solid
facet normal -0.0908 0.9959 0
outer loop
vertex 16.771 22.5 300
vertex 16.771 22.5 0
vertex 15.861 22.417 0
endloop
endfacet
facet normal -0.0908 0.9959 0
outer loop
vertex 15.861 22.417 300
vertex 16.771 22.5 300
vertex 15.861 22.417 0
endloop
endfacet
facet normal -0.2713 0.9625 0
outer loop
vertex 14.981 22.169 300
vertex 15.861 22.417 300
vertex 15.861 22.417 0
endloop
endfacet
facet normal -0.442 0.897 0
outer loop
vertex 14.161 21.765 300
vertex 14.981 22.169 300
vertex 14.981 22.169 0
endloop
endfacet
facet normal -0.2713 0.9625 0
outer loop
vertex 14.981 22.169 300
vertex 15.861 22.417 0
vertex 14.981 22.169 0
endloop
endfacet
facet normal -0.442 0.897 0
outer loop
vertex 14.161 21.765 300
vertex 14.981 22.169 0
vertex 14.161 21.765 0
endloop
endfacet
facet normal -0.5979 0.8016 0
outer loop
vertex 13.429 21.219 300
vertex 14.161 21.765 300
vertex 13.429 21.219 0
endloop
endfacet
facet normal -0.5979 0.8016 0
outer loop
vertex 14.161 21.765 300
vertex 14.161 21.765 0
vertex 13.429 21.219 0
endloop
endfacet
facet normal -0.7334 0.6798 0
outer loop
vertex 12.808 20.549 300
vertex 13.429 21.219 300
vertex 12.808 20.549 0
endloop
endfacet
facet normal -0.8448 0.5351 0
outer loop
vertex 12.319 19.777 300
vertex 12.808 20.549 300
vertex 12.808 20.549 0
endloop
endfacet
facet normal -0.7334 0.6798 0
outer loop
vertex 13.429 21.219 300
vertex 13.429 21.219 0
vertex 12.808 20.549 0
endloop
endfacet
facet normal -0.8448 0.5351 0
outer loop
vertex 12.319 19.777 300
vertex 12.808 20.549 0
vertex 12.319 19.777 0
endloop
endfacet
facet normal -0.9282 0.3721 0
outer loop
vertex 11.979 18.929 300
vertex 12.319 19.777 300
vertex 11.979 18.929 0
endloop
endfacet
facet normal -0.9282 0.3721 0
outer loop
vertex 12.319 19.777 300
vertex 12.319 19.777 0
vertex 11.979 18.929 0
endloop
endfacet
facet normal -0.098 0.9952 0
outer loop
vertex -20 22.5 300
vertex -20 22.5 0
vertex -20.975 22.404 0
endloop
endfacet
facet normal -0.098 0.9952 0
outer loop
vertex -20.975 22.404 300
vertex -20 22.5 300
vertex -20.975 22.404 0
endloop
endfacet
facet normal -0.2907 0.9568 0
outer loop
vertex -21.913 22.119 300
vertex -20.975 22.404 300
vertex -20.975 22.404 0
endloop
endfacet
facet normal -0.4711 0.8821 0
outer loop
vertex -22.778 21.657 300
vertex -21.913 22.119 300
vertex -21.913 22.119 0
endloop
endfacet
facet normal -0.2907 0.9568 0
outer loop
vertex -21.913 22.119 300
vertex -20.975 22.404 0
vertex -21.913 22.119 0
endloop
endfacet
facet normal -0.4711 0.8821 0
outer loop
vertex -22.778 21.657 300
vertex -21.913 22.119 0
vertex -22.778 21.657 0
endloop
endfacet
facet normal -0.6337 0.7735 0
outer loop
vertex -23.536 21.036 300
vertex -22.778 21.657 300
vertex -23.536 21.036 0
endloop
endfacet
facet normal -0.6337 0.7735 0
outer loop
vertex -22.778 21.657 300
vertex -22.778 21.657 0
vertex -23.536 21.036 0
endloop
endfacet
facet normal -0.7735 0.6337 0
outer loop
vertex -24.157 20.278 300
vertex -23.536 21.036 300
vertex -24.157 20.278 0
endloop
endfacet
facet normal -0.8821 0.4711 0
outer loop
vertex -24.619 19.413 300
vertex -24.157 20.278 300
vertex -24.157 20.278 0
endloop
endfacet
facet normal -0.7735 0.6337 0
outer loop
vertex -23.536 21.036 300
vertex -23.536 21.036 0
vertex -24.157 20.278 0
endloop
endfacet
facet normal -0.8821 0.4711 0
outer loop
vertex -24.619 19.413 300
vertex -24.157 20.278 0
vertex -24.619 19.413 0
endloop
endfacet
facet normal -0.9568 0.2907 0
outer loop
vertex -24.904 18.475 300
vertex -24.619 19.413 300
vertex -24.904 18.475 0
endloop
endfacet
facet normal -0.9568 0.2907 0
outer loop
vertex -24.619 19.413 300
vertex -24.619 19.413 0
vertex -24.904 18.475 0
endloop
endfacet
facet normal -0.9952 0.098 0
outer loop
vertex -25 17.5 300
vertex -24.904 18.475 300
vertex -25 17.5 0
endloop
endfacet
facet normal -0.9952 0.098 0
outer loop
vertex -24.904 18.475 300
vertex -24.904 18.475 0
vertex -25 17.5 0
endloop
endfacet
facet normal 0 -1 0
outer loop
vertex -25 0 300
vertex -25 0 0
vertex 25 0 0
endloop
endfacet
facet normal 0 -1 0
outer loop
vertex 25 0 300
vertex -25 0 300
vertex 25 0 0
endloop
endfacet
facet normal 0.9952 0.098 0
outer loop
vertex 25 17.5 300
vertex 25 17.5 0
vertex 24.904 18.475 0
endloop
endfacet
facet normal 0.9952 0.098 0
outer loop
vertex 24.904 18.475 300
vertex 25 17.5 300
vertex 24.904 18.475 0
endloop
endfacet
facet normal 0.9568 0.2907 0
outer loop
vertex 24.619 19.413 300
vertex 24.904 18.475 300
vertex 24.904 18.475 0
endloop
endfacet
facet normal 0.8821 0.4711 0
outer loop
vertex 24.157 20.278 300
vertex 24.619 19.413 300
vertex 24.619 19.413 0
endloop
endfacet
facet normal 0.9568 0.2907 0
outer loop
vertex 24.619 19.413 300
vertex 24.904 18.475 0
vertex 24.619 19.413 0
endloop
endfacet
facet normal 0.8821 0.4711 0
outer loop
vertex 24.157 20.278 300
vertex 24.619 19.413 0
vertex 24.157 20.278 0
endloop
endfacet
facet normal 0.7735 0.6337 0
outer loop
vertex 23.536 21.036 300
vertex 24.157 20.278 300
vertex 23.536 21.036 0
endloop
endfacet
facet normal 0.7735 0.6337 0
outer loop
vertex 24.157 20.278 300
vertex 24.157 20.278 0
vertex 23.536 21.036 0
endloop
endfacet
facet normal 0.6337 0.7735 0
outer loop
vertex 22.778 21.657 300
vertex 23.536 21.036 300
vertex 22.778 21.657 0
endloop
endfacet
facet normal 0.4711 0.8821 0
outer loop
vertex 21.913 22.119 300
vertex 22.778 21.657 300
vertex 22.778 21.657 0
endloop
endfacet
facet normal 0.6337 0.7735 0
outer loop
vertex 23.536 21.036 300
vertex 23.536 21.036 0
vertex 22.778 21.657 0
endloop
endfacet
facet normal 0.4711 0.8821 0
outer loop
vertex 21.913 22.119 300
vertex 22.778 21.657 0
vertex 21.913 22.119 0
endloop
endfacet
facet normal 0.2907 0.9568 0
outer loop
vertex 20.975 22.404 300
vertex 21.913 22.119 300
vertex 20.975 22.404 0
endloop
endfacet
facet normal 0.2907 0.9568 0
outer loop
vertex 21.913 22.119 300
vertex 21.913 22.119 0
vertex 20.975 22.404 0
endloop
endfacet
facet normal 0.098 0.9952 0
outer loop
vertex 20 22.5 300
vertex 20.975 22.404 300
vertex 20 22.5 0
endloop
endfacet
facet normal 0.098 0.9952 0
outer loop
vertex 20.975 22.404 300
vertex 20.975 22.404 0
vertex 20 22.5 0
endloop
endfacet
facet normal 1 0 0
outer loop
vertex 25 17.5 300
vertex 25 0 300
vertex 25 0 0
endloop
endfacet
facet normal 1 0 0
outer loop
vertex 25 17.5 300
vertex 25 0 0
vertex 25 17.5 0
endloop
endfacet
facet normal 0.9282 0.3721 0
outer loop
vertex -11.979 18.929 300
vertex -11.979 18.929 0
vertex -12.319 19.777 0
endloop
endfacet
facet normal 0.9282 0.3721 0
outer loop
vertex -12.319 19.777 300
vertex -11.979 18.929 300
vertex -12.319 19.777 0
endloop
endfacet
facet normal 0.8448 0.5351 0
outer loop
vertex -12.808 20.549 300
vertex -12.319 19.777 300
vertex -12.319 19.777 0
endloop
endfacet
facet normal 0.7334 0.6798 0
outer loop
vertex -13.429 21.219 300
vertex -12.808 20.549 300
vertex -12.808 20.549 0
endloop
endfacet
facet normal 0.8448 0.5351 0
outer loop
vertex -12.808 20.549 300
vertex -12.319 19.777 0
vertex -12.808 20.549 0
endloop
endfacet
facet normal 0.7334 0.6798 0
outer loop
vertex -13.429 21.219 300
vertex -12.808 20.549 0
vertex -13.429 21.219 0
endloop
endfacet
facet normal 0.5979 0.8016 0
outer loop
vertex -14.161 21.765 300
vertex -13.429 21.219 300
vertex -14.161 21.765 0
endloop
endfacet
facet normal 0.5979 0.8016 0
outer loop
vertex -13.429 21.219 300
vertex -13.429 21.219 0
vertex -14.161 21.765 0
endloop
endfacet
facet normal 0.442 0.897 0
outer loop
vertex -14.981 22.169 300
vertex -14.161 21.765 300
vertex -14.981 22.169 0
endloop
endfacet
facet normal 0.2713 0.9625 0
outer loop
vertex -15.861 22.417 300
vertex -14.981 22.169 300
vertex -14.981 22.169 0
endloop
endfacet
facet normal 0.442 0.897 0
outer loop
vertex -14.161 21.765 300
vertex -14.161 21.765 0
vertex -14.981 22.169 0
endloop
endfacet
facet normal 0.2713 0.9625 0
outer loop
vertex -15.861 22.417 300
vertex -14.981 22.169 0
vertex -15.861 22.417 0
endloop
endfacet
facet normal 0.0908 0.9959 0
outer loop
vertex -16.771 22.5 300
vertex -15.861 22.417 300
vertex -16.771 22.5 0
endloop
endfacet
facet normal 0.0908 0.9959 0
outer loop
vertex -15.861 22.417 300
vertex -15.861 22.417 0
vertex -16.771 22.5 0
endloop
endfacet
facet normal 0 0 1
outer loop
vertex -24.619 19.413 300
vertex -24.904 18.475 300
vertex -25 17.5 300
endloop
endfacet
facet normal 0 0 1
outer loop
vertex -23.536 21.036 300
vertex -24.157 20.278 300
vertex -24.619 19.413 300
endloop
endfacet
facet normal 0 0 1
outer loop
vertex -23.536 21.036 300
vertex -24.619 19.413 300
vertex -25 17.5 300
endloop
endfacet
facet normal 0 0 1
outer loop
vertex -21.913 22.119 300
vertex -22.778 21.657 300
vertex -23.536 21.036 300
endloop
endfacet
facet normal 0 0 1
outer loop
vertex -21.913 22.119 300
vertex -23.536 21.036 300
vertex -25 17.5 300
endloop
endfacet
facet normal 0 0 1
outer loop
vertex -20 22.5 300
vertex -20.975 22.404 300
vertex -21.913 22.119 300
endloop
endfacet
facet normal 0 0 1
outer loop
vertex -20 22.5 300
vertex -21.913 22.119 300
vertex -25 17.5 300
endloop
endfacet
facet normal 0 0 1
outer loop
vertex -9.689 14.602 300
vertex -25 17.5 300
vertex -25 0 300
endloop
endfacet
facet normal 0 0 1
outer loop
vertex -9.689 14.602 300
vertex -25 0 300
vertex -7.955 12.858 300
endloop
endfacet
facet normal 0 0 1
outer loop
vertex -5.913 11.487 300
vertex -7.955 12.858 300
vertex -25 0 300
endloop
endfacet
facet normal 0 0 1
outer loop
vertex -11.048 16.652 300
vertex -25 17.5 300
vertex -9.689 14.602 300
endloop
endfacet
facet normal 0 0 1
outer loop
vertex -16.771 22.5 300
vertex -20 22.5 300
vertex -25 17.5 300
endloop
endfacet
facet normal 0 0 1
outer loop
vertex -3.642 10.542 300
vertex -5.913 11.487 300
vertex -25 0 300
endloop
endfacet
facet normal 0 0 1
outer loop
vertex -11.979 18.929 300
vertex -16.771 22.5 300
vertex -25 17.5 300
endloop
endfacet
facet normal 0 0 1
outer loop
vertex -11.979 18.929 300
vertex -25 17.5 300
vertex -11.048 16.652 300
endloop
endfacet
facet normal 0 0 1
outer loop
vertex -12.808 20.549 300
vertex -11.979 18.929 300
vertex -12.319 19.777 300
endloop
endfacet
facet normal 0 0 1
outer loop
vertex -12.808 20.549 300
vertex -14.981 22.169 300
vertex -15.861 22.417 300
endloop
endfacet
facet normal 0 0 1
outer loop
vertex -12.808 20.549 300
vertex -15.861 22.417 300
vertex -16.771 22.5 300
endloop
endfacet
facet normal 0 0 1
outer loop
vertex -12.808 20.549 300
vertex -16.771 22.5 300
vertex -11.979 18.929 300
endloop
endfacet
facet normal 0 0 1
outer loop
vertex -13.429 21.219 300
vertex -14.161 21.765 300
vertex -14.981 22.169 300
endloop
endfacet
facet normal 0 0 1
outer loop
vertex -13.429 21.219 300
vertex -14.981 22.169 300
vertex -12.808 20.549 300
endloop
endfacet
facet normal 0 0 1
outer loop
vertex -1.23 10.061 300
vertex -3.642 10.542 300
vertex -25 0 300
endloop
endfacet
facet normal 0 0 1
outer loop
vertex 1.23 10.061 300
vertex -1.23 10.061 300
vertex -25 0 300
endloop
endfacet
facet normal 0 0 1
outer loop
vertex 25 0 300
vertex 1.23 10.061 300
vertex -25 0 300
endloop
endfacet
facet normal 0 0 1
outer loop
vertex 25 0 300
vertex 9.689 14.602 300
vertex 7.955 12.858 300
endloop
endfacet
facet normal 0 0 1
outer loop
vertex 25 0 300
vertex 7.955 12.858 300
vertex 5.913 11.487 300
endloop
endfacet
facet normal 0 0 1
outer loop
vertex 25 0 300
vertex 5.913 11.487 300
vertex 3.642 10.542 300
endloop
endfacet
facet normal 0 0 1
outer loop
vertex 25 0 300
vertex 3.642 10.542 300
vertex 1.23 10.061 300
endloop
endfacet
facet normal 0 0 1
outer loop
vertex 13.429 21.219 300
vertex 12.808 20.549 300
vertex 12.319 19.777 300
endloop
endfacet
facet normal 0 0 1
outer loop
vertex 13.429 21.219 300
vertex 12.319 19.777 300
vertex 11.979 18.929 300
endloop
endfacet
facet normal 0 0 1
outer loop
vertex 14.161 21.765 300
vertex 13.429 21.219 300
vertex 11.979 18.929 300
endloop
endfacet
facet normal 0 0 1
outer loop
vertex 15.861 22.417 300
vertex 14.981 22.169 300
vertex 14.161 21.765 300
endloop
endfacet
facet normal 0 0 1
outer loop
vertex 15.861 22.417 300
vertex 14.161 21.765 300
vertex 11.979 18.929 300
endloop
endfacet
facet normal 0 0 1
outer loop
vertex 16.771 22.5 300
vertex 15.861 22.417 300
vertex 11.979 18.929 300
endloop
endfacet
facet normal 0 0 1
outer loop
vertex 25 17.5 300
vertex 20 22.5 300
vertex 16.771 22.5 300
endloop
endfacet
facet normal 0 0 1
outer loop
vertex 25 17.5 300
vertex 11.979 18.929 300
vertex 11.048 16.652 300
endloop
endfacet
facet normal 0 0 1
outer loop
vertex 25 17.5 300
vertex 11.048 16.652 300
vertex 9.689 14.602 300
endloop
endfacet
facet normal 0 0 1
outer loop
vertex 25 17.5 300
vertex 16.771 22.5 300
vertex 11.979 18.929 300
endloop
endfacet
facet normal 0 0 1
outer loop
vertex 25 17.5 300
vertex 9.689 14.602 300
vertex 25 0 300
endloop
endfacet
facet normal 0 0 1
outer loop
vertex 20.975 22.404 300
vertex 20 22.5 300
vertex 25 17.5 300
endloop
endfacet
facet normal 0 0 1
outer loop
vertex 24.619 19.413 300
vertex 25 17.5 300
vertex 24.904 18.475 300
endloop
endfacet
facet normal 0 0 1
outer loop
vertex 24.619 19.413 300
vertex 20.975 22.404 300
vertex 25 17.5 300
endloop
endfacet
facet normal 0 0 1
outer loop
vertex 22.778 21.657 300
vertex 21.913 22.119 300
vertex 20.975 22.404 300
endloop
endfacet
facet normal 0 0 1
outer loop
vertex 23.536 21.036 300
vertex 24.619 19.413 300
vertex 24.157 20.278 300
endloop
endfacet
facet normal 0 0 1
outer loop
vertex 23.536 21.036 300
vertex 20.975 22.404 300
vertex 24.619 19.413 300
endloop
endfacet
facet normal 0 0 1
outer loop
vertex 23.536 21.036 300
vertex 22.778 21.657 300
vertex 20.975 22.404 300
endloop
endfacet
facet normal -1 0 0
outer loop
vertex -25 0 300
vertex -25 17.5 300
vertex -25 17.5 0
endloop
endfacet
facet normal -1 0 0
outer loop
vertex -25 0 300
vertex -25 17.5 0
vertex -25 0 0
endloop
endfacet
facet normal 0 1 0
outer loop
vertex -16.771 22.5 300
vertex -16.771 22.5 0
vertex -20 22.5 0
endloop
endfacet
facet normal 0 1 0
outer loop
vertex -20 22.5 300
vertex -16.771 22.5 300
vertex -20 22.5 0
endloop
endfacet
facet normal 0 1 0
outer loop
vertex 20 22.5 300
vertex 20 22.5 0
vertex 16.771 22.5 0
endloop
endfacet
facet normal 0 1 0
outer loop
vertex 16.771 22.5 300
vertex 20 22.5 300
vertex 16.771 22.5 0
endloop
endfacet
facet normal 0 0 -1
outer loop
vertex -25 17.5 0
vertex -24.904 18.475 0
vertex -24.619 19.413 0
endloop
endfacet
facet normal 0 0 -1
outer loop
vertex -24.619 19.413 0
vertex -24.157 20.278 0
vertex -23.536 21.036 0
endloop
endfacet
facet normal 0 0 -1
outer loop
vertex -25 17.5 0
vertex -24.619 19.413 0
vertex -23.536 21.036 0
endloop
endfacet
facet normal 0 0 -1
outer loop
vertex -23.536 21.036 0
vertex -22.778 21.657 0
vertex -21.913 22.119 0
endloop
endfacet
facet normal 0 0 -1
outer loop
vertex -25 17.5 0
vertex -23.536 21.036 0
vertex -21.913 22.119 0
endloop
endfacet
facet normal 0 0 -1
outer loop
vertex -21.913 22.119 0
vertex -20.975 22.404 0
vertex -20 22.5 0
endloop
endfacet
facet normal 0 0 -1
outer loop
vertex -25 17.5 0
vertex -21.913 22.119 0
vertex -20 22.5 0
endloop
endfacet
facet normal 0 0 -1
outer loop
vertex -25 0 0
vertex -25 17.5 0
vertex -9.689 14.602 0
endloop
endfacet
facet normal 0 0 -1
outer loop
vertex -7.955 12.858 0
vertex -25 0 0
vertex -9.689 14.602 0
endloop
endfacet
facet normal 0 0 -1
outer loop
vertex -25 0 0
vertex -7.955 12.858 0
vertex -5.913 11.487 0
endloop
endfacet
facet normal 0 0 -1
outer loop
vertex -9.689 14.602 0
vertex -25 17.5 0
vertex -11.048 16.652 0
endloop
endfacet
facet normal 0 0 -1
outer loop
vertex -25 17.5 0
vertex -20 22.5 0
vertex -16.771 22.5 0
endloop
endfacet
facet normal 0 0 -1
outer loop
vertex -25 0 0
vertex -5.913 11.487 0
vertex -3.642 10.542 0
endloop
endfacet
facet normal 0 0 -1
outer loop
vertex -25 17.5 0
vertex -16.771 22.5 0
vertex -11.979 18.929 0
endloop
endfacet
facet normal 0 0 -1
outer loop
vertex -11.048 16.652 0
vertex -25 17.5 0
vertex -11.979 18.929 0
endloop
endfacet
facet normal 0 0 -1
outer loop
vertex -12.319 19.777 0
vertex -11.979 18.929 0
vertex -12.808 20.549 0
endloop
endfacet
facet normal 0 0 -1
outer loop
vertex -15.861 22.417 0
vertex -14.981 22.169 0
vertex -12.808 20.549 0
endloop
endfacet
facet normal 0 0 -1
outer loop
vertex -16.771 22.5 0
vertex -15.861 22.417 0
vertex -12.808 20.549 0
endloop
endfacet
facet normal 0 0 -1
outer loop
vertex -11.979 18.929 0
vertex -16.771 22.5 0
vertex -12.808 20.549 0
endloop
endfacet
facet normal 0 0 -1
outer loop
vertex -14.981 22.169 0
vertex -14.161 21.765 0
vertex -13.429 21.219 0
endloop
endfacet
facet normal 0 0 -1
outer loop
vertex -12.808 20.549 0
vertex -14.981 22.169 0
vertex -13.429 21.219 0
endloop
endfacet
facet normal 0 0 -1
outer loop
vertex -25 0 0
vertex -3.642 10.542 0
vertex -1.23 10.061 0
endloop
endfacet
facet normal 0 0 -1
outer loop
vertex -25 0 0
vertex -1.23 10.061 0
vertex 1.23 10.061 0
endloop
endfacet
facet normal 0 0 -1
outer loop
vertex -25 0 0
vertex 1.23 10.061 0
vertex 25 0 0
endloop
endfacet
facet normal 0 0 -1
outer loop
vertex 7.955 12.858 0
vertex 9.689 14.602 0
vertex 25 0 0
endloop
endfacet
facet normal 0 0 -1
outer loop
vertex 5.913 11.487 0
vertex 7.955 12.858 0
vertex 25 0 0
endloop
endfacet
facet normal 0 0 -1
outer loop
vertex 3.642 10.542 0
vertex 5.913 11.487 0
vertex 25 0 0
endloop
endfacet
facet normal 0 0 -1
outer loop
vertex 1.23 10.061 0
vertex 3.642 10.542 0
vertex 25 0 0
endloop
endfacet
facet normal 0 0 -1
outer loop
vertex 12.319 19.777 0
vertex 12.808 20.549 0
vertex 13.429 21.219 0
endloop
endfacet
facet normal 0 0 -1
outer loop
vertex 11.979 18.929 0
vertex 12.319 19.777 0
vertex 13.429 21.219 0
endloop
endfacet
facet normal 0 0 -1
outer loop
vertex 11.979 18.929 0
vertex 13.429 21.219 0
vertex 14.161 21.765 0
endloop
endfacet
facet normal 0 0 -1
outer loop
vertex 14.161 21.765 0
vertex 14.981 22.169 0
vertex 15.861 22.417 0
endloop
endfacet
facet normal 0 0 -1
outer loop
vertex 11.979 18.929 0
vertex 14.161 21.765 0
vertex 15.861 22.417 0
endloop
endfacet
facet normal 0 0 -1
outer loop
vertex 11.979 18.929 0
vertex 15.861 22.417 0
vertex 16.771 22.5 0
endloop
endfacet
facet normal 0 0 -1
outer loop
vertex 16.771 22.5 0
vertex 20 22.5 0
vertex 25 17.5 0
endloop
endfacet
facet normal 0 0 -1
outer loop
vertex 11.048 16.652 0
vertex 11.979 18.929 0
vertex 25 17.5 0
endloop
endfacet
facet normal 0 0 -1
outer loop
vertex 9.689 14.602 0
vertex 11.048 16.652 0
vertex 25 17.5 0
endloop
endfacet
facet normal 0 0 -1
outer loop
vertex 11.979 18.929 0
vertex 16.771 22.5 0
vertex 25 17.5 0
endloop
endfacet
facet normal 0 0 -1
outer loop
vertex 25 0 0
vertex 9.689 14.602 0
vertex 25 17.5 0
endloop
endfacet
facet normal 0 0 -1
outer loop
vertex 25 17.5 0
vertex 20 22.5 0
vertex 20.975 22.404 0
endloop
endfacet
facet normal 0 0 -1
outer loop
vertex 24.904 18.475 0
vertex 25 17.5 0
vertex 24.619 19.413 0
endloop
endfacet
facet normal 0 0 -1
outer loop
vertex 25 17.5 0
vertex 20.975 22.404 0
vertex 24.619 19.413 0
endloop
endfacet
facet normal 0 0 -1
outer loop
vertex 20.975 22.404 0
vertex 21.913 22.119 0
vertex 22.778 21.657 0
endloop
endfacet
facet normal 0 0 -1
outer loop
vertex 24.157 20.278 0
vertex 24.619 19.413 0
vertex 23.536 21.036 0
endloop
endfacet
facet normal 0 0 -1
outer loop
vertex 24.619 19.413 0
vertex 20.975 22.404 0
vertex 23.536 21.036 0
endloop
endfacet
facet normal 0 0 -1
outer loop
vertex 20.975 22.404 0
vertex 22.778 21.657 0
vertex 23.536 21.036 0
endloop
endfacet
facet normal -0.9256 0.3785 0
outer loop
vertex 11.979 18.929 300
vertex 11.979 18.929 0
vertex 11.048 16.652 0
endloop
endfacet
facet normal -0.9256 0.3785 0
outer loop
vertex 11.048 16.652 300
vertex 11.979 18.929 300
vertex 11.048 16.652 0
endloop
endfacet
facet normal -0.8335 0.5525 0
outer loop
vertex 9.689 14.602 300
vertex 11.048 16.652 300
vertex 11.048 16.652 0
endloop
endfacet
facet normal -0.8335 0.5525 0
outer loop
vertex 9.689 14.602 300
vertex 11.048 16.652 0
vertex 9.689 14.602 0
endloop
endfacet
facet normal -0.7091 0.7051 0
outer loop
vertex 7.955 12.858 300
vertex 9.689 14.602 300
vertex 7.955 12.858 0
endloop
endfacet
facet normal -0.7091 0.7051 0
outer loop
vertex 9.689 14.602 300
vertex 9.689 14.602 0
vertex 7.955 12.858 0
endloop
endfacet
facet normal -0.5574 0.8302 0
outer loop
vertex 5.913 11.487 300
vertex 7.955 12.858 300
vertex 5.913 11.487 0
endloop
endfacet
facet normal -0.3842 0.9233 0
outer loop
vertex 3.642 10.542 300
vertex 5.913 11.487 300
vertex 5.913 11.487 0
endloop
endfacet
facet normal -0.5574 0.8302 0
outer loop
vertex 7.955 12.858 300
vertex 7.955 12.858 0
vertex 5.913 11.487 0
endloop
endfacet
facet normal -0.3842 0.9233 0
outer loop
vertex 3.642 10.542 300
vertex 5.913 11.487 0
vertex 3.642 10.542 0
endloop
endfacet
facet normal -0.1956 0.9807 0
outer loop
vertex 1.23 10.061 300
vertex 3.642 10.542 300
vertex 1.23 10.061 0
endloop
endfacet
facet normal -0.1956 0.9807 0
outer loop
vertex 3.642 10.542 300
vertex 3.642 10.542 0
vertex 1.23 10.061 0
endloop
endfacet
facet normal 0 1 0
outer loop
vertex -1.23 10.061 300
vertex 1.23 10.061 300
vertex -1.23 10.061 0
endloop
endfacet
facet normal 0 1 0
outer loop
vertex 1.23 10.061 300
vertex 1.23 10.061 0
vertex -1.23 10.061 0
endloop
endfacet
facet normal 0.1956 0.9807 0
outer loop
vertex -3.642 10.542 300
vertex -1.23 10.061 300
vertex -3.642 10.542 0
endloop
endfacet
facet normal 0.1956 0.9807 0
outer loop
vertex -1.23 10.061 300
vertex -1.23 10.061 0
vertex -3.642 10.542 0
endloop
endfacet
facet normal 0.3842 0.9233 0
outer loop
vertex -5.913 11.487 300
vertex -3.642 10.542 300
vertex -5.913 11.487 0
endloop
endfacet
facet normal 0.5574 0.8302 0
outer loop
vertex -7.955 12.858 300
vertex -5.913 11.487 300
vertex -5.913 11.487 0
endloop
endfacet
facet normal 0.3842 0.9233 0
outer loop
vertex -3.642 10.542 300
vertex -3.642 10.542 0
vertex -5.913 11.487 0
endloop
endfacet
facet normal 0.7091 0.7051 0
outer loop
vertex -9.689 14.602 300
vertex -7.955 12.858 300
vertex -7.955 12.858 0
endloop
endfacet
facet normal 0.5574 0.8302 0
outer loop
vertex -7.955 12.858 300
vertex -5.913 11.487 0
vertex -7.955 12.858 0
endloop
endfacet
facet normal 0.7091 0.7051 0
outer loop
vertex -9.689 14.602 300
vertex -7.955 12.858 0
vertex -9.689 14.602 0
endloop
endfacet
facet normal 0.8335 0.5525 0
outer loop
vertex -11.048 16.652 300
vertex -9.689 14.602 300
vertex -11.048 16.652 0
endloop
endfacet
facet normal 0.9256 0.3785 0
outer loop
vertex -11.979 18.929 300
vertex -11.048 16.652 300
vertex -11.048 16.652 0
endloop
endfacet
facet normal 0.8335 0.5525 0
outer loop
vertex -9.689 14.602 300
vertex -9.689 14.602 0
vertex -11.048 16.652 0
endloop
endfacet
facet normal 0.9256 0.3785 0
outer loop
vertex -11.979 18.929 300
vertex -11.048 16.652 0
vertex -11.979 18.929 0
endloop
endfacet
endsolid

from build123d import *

# Parameters (mm, degrees)
BOSS_EXTRUDE1_DEPTH = 300


with BuildPart() as part:
    # Sketch3 → Boss-Extrude1 (new body)
    with BuildSketch(Plane.XY):
        with BuildLine():
            Line((-25, 0), (25, 0))
            Line((25, 0), (25, 17.5))
            ThreePointArc((25, 17.5), (23.535533906, 21.035533906), (20, 22.5))
            Line((20, 22.5), (16.770509831, 22.5))
            ThreePointArc((16.770509831, 22.5), (13.782438308, 21.508918629), (11.978935594, 18.928571429))
            ThreePointArc((11.978935594, 18.928571429), (0, 10), (-11.978935594, 18.928571429))
            ThreePointArc((-11.978935594, 18.928571429), (-13.782438308, 21.508918629), (-16.770509831, 22.5))
            Line((-16.770509831, 22.5), (-20, 22.5))
            ThreePointArc((-20, 22.5), (-23.535533906, 21.035533906), (-25, 17.5))
            Line((-25, 17.5), (-25, 0))
        make_face()
    extrude(amount=BOSS_EXTRUDE1_DEPTH)


solid = part.part
